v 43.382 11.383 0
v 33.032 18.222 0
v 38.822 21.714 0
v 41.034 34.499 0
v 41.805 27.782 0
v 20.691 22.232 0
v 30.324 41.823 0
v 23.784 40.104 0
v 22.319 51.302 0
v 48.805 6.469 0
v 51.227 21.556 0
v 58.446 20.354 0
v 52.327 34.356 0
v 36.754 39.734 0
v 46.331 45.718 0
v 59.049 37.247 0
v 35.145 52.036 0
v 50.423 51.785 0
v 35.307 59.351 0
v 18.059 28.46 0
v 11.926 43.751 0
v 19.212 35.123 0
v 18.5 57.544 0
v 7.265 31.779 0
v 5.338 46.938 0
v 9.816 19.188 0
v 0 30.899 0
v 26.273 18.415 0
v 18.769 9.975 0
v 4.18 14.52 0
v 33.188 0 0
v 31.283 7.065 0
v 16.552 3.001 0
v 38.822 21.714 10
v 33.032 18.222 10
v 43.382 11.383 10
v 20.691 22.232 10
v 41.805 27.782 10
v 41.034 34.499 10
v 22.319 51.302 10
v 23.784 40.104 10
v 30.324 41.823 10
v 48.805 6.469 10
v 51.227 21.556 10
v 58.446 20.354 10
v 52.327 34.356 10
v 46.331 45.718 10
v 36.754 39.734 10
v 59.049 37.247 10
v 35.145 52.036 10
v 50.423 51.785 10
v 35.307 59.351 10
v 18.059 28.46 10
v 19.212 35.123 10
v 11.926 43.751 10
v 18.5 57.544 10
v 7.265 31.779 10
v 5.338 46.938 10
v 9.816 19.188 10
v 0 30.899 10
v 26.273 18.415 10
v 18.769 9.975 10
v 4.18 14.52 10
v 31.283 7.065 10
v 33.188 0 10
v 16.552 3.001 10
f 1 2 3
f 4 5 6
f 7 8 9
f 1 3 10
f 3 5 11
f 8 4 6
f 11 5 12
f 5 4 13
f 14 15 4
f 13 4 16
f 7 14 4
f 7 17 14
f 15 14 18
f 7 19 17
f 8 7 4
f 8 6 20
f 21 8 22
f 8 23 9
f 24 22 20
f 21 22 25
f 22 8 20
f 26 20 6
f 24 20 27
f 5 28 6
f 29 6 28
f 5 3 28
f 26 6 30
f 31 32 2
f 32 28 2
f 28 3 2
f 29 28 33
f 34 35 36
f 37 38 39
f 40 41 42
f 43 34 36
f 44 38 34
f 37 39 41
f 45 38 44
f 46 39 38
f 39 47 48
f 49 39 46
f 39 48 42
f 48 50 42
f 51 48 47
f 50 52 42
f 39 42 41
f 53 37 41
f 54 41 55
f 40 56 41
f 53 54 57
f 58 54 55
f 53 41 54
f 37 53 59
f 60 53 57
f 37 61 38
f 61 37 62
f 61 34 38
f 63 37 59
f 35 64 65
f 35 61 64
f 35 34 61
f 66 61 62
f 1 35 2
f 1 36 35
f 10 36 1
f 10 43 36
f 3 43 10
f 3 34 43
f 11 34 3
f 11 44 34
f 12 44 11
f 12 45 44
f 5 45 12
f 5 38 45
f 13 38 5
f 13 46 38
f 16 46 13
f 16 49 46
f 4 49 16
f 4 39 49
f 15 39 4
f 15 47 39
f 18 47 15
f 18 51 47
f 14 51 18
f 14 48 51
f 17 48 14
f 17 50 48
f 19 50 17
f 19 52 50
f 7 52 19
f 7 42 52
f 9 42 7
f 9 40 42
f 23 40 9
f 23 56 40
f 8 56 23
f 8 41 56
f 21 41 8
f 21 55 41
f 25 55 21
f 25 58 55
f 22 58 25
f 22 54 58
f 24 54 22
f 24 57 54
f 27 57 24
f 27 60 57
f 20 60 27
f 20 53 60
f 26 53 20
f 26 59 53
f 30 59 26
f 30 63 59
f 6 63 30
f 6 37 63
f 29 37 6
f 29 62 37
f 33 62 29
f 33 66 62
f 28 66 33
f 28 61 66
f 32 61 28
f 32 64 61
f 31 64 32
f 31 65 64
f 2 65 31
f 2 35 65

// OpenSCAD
$fn = 32;

// ----------------------------------------------------------------------
// Fan rotor section: 11 blades, 12 mm hub radius, 18 mm blades
// ----------------------------------------------------------------------

// --- parameters (mm) ---
profile_height = 10;      // extrusion height
profile_points = 33;      // points of the closed outline

profile = [[41.805, 27.782], [52.327, 34.356], [59.049, 37.247], [41.034, 34.499], [46.331, 45.718], [50.423, 51.785], [36.754, 39.734], [35.145, 52.036], [35.307, 59.351], [30.324, 41.823], [22.319, 51.302], [18.5, 57.544], [23.784, 40.104], [11.926, 43.751], [5.338, 46.938], [19.212, 35.123], [7.265, 31.779], [0, 30.899], [18.059, 28.46], [9.816, 19.188], [4.18, 14.52], [20.691, 22.232], [18.769, 9.975], [16.552, 3.001], [26.273, 18.415], [31.283, 7.065], [33.188, 0], [33.032, 18.222], [43.382, 11.383], [48.805, 6.469], [38.822, 21.714], [51.227, 21.556], [58.446, 20.354]];  // single closed polygon, 33 points, counter clockwise

// --- the one profile operation ---
linear_extrude(height = profile_height) polygon(points = profile);
